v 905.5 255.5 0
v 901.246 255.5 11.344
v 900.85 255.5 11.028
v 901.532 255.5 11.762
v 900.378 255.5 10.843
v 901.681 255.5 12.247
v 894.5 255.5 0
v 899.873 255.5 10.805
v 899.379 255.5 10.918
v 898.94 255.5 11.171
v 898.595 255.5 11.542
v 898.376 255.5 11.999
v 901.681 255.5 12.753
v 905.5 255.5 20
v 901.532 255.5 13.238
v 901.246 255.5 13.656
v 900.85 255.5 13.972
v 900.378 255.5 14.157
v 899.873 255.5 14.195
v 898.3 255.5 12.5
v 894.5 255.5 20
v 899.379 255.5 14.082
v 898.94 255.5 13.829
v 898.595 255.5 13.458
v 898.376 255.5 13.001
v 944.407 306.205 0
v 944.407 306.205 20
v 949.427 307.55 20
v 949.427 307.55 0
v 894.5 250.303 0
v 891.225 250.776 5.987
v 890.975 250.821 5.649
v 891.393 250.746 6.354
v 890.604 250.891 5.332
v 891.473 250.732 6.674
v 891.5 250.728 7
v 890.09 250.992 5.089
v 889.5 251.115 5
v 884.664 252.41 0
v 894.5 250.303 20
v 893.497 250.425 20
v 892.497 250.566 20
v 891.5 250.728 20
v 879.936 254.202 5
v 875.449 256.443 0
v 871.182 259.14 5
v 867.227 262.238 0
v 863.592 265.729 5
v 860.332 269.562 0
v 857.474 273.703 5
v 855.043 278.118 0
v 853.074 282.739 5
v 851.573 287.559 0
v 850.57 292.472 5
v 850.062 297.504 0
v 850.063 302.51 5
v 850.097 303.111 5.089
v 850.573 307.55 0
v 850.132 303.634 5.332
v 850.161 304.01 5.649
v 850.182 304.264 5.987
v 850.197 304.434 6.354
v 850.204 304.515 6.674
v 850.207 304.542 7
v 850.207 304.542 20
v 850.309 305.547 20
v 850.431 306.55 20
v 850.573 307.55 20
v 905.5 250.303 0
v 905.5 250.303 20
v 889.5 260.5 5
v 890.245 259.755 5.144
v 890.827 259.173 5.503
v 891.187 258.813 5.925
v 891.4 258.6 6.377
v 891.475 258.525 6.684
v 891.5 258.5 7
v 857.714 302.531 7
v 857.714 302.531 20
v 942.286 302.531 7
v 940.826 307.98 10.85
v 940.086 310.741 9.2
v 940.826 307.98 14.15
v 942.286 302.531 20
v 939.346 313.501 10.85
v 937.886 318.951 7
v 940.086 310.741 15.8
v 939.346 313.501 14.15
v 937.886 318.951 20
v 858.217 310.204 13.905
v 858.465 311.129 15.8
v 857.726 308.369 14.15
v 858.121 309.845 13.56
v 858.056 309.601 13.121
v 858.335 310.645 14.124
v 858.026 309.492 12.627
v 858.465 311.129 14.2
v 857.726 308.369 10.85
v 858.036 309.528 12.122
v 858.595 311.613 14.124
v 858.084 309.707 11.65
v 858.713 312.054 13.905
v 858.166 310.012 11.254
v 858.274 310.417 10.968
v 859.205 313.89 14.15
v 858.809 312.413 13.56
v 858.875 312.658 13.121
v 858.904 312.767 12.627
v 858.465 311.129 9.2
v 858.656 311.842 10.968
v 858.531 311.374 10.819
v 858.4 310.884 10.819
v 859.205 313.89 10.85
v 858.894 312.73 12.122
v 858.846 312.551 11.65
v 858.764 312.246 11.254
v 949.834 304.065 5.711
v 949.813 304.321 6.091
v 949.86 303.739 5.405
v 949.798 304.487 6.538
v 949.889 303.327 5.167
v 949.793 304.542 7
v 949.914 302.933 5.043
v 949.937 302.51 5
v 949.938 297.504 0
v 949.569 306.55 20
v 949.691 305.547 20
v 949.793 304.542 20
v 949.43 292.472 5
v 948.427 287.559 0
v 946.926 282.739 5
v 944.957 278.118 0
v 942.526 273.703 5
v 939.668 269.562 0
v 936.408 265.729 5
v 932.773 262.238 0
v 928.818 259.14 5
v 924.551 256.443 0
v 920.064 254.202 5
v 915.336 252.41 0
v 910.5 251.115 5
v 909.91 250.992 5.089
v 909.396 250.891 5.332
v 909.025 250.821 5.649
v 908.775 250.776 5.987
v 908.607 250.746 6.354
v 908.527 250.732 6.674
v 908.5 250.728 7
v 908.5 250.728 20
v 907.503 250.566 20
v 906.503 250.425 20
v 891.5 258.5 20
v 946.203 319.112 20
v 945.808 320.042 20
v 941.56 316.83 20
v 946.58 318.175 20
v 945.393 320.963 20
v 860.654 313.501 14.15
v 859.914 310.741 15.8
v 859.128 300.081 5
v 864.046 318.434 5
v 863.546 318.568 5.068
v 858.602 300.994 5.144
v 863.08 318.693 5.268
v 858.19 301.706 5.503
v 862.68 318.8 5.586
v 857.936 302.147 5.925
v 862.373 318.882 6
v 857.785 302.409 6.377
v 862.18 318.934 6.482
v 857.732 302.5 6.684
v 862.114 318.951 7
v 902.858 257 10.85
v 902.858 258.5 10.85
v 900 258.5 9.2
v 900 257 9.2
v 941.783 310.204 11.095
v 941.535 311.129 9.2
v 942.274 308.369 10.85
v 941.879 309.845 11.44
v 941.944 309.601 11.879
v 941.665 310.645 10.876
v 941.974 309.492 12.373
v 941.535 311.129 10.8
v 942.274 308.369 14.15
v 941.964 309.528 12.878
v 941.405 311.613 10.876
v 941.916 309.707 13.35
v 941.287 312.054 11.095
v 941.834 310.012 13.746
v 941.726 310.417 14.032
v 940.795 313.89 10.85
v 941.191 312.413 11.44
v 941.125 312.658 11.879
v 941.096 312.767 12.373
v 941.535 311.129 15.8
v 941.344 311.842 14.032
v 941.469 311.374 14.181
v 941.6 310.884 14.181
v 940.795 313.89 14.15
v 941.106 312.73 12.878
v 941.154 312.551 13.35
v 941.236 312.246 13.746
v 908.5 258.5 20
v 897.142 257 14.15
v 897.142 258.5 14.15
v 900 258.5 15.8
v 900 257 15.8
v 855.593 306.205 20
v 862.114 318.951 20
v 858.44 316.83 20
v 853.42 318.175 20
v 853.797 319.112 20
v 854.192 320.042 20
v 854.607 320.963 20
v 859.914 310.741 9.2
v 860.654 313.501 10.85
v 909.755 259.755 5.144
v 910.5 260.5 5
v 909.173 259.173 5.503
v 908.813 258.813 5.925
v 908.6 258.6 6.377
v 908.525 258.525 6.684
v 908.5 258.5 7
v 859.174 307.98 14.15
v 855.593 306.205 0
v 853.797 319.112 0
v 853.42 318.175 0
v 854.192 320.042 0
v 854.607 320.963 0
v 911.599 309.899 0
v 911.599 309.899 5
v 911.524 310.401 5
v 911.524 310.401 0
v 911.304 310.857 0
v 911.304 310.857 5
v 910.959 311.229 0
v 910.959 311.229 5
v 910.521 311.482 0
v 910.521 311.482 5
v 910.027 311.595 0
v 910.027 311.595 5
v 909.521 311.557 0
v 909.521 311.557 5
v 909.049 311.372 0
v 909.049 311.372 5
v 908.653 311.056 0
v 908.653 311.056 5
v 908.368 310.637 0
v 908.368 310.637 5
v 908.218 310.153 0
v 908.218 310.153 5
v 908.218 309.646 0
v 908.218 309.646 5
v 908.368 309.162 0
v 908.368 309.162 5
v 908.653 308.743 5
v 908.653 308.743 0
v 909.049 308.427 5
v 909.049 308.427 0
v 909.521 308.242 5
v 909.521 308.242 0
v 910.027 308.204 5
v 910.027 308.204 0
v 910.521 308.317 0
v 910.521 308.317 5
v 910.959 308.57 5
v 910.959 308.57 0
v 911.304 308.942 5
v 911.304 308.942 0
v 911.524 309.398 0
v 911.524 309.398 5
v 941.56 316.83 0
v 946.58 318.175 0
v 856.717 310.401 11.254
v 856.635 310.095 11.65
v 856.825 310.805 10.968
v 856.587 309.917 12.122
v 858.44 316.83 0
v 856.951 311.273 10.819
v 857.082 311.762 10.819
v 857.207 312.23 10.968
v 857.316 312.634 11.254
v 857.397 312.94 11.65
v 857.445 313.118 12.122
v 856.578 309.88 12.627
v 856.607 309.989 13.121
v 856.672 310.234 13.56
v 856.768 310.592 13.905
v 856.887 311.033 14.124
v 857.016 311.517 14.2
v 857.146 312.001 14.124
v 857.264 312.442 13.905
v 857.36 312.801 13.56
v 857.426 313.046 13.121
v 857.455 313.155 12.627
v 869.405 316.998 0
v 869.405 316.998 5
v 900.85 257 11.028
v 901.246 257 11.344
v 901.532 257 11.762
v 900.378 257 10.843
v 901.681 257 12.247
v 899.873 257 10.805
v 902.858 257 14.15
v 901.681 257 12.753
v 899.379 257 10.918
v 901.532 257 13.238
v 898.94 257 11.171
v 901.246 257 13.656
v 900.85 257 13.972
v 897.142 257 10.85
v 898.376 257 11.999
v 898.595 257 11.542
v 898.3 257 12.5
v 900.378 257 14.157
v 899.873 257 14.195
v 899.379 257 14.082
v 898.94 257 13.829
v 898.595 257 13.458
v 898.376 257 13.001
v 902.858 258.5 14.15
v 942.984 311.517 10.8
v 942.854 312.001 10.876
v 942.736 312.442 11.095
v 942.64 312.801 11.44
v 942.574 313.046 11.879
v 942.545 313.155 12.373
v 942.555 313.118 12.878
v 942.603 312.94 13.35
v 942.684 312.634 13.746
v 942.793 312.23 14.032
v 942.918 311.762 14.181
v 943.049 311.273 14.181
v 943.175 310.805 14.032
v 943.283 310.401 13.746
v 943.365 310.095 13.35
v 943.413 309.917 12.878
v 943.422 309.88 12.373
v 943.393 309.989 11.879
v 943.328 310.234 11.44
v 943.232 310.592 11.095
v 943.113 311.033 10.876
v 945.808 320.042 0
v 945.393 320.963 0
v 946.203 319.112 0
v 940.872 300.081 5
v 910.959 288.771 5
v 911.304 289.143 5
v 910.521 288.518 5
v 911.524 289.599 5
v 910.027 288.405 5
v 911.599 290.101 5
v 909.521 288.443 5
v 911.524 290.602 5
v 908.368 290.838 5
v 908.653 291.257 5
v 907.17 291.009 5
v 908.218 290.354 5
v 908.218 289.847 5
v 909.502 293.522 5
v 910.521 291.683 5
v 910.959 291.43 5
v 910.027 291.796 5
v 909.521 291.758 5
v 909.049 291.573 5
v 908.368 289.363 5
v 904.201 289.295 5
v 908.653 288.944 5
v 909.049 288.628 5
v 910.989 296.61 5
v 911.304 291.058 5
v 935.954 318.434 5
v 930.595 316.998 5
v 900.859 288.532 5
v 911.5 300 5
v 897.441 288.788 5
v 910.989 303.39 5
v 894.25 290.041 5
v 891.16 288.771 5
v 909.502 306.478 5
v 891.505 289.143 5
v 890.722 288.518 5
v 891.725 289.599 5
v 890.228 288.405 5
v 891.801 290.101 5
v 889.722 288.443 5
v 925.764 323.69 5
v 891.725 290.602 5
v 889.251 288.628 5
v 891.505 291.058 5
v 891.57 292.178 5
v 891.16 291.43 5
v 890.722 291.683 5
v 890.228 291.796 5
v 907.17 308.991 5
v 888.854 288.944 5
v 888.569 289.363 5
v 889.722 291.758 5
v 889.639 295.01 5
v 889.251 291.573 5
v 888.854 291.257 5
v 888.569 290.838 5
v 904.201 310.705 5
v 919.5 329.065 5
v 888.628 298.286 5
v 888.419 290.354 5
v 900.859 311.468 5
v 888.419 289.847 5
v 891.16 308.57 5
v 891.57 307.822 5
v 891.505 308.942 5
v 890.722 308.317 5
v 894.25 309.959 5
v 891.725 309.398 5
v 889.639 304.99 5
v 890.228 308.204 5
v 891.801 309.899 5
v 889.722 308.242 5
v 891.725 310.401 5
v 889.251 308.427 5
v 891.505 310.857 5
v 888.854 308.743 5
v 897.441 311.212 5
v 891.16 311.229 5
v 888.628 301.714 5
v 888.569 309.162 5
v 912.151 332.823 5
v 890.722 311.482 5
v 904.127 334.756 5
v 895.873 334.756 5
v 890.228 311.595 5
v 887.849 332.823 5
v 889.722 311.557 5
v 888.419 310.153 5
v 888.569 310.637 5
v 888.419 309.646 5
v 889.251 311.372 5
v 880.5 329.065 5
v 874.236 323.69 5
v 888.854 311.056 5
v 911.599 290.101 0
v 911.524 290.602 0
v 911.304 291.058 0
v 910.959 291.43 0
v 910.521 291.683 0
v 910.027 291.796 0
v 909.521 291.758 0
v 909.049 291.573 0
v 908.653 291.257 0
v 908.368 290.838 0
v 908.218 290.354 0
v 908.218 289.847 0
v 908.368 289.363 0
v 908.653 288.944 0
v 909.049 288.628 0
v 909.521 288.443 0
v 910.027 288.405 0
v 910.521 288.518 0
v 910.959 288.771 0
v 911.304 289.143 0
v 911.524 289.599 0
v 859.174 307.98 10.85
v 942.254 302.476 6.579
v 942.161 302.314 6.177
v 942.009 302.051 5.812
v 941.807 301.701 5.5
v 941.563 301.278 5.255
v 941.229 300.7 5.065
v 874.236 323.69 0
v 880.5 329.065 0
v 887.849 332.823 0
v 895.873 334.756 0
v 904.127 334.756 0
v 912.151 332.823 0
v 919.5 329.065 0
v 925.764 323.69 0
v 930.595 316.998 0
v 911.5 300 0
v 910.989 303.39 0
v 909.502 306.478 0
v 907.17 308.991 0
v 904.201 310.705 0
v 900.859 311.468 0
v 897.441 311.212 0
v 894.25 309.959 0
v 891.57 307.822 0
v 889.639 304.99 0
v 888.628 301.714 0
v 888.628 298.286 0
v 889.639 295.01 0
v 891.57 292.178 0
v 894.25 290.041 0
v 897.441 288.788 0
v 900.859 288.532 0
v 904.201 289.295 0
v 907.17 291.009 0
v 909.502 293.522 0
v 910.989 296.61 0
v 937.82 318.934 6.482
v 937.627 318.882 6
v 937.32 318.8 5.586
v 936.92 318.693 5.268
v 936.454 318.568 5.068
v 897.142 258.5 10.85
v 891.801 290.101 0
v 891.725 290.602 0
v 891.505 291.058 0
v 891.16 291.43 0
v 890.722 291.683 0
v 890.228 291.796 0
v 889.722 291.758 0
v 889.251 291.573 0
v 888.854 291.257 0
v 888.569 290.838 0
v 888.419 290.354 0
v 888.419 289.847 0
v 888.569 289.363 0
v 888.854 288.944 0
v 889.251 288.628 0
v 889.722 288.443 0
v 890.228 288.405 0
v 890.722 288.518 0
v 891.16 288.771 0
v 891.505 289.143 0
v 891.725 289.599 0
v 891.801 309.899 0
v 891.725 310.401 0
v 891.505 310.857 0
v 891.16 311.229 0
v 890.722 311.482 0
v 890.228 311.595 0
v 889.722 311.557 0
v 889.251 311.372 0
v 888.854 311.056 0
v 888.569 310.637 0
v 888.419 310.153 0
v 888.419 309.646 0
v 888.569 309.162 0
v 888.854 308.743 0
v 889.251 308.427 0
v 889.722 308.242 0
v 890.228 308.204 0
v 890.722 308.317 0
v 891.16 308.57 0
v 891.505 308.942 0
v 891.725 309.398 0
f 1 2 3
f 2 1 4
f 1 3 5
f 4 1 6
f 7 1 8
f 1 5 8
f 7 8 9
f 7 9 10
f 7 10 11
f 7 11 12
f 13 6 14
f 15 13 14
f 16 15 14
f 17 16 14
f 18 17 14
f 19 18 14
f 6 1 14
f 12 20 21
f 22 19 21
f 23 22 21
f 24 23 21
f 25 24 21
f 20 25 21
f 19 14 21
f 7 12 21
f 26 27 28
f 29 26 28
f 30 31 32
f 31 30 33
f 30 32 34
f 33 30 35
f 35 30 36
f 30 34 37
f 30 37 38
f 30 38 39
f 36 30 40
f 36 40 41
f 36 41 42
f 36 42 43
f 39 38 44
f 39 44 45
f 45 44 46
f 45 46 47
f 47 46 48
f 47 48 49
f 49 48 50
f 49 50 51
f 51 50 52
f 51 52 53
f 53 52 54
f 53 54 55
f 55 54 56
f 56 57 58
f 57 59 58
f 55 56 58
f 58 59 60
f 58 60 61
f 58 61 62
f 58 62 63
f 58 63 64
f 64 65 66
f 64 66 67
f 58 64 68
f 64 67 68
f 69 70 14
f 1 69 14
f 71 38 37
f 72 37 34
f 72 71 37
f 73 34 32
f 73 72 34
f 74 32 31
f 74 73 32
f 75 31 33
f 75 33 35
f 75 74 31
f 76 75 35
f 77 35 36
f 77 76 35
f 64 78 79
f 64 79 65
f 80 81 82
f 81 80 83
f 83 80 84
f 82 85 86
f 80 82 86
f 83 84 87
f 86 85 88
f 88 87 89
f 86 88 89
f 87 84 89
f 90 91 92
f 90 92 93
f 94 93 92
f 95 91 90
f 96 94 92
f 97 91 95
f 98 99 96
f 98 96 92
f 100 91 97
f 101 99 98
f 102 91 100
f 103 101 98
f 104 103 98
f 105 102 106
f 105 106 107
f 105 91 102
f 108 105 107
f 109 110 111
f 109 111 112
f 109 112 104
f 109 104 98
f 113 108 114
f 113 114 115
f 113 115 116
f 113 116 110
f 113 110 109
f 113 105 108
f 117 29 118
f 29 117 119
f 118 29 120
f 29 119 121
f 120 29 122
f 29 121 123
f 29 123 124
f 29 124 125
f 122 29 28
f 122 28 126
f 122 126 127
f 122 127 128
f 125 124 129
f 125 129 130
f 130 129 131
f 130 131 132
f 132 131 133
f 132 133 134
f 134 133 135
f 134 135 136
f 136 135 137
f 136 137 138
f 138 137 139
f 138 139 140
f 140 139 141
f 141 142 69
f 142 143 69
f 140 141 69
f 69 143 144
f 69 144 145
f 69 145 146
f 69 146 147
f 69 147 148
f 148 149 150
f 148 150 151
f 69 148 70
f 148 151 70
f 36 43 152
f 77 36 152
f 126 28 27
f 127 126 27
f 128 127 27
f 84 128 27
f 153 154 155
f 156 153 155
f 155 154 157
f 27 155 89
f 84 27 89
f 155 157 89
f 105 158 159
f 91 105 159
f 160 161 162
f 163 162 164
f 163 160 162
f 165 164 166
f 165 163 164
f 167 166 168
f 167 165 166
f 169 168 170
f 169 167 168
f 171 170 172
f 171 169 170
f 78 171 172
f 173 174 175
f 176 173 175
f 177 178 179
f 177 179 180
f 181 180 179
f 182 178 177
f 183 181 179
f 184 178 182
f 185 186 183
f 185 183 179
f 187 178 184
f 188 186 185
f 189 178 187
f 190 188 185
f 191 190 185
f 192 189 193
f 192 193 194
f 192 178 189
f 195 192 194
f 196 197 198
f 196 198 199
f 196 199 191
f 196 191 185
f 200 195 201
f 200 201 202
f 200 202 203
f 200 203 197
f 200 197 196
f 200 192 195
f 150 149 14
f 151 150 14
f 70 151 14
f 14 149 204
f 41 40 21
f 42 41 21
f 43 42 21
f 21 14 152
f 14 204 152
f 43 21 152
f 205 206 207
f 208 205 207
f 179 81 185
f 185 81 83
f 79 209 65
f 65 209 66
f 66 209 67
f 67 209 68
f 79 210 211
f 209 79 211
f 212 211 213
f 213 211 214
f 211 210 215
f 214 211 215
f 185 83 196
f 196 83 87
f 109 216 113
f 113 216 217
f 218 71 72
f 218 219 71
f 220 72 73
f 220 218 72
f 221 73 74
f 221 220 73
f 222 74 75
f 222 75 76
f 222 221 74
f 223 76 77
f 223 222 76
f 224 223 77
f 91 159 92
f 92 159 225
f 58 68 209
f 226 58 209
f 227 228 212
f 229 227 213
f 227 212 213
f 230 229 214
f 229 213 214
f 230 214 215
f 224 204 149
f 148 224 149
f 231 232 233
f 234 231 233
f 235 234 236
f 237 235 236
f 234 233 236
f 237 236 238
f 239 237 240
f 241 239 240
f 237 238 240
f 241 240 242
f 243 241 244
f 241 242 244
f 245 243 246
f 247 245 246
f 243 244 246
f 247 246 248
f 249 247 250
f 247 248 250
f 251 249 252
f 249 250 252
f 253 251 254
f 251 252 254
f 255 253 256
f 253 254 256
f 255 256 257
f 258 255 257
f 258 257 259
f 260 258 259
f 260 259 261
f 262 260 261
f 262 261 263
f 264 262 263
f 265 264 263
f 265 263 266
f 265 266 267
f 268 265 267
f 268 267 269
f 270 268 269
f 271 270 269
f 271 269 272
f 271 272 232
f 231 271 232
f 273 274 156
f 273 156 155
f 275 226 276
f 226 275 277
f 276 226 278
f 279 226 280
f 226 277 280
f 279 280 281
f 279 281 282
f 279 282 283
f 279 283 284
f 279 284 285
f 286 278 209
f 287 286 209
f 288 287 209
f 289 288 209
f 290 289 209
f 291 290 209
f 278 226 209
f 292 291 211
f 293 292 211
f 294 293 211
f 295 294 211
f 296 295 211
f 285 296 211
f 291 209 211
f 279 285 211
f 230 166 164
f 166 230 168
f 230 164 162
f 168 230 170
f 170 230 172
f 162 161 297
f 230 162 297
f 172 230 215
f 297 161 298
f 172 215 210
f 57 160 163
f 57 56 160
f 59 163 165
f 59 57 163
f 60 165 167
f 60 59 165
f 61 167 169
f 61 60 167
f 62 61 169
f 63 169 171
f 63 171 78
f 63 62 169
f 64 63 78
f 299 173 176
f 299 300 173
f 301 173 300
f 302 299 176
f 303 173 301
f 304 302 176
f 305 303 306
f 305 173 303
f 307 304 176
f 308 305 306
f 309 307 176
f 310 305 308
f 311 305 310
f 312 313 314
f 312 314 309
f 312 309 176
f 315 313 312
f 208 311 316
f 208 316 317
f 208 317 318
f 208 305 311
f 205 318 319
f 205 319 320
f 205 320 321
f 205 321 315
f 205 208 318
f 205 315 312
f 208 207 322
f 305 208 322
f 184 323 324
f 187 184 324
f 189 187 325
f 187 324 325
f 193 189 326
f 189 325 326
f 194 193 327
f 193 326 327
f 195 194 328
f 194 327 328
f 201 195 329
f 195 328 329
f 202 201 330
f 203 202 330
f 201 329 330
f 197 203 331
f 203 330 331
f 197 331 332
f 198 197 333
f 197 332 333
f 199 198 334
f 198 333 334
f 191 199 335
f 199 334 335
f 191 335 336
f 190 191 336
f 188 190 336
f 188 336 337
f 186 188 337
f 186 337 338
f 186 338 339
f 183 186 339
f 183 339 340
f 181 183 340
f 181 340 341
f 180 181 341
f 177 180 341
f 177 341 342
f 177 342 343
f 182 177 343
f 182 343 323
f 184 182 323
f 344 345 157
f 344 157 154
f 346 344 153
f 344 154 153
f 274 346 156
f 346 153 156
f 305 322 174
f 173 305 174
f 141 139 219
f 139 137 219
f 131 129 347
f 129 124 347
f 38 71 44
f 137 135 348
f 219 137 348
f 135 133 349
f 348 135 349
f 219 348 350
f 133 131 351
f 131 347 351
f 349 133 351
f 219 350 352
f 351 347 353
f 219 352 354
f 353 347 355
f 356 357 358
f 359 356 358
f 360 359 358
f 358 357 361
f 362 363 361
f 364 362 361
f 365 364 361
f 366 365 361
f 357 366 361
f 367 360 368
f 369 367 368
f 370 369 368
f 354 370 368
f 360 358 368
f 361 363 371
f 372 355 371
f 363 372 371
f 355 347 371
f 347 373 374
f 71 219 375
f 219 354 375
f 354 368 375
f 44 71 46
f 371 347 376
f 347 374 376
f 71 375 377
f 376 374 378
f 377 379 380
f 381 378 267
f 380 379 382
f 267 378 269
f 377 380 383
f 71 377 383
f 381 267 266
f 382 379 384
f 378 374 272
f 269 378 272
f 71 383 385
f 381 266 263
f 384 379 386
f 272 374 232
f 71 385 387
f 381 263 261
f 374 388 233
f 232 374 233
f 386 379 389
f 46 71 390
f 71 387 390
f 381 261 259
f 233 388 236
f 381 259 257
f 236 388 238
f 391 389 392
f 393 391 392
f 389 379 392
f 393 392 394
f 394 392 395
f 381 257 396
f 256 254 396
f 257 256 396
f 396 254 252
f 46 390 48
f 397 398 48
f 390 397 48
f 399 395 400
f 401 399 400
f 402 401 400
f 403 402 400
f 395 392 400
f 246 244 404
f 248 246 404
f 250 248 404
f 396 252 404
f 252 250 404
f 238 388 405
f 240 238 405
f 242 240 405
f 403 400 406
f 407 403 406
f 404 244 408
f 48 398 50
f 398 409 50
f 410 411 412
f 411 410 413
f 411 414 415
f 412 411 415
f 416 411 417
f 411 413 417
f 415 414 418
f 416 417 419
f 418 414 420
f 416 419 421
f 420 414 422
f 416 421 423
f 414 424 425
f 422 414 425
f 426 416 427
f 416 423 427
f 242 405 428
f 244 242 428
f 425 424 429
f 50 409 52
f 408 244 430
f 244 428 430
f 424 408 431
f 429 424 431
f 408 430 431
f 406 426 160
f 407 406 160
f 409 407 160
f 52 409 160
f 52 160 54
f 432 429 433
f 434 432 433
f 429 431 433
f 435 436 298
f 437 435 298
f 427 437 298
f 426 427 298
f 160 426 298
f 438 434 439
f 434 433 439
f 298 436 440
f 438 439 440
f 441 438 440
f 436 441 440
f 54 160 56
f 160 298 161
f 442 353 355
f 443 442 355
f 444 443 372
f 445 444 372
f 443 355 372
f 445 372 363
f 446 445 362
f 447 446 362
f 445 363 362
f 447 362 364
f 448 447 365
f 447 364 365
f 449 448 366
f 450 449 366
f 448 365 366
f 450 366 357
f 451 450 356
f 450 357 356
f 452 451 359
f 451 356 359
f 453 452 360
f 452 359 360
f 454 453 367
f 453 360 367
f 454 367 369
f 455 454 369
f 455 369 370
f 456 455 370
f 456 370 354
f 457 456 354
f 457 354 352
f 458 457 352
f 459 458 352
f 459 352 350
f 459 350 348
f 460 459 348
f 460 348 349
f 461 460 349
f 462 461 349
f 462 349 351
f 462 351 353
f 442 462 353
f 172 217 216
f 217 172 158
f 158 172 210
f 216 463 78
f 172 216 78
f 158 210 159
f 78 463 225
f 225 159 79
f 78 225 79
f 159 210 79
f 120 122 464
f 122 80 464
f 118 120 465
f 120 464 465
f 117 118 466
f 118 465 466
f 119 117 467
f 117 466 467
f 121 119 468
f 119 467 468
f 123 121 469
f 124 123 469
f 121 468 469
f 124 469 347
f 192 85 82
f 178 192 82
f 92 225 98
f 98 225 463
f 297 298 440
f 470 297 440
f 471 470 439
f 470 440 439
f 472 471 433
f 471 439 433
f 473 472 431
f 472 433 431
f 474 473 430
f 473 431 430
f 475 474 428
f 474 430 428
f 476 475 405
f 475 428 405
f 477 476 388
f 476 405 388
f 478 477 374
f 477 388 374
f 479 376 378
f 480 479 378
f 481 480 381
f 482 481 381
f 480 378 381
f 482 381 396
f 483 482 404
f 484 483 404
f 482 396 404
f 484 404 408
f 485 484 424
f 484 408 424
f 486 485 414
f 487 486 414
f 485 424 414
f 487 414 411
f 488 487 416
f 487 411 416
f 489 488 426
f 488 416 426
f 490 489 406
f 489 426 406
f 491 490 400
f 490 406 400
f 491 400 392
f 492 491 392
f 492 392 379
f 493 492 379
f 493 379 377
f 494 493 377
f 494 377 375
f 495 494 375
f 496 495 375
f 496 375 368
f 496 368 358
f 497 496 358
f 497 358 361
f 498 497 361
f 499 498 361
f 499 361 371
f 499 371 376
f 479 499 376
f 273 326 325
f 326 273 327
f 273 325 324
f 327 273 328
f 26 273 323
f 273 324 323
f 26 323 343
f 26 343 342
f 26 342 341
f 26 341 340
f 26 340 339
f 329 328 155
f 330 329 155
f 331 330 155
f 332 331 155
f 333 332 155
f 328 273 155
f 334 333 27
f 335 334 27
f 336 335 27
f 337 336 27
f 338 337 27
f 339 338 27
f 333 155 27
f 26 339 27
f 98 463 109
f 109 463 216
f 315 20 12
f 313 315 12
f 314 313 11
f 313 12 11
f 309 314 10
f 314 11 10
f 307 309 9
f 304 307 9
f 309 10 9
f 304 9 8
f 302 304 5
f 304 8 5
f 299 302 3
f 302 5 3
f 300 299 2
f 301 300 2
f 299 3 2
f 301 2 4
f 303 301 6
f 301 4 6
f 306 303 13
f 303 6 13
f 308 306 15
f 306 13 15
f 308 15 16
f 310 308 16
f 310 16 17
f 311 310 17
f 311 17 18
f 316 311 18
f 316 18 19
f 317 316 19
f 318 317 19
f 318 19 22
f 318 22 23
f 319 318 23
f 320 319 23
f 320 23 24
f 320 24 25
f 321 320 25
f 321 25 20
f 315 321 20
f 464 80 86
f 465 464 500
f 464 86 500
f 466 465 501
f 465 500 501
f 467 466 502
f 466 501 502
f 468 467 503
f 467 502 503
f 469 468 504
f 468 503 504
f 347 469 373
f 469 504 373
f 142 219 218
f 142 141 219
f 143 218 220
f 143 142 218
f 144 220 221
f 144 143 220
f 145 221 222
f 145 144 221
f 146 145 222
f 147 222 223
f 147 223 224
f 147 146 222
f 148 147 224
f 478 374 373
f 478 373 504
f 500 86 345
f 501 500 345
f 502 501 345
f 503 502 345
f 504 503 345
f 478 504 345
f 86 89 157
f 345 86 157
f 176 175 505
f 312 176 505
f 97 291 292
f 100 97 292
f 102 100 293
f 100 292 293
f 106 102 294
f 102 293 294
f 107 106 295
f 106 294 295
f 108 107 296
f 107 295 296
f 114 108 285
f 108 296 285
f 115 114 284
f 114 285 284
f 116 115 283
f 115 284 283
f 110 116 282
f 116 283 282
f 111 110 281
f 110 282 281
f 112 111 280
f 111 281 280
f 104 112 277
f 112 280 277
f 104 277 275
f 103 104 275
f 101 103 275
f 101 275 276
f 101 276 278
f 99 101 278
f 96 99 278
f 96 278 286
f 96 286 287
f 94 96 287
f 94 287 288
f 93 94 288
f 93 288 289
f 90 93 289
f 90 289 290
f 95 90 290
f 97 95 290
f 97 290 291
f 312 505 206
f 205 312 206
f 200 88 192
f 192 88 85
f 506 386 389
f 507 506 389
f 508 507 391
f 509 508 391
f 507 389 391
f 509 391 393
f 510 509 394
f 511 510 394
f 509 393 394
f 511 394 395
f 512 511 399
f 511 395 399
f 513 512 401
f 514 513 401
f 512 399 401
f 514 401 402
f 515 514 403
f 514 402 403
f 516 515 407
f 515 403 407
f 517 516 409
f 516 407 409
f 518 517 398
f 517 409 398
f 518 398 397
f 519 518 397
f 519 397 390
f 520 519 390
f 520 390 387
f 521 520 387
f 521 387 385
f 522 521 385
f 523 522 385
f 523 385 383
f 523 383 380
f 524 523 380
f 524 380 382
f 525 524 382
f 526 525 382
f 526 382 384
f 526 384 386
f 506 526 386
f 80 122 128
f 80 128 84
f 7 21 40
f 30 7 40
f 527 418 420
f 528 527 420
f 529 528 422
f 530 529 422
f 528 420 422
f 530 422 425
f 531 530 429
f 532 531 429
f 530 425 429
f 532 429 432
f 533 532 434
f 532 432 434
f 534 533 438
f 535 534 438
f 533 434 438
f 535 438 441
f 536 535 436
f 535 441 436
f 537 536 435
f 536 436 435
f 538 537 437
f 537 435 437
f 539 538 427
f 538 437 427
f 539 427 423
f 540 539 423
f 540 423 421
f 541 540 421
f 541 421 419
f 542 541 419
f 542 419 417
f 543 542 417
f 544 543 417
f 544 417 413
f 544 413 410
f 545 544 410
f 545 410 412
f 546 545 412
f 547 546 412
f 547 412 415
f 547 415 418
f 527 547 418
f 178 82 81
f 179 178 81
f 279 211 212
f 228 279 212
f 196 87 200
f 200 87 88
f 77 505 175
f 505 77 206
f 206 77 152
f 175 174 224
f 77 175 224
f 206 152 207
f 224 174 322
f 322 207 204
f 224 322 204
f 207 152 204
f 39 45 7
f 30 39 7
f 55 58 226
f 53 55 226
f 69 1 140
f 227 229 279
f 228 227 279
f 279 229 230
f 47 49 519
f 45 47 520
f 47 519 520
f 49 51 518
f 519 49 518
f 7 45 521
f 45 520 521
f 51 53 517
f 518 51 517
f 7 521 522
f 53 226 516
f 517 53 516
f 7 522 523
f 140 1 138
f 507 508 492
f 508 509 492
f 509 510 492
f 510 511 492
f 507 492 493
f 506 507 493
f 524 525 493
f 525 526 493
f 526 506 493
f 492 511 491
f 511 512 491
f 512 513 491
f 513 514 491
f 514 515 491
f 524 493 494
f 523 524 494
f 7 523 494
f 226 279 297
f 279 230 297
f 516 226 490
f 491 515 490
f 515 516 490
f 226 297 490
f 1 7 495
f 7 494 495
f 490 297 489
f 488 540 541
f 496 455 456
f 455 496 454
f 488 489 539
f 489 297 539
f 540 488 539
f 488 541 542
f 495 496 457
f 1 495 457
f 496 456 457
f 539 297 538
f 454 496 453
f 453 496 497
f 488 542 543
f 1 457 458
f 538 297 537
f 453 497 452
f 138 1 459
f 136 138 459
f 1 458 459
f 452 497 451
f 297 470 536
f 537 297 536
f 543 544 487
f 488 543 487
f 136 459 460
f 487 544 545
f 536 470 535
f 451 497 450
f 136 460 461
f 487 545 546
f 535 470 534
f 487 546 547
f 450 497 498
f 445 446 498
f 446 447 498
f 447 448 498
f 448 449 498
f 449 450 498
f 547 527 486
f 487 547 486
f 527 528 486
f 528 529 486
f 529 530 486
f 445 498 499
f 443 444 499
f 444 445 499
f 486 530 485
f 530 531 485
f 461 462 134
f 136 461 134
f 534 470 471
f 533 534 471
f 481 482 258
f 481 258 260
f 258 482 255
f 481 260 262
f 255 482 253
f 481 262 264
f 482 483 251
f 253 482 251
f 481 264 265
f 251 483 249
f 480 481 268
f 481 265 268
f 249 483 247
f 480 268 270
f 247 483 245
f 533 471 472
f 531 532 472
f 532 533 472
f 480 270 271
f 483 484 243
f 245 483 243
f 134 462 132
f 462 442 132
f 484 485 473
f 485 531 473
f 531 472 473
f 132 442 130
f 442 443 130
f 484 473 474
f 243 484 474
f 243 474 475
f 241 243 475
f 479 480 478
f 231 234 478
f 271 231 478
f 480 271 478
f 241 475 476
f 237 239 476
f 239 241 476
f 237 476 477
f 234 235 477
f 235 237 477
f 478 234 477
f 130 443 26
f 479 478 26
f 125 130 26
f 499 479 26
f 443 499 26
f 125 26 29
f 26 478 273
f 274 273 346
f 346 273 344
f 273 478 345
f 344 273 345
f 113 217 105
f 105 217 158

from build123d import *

# Parameters (mm, degrees)
CUT_EXTRUDE_1_DEPTH         = 1013.4351831105043
EXTRUDE_START               = 14.999999999999998
EXTRUDE_1_DEPTH             = 14.999999999999998
CUT_EXTRUDE_2_DEPTH         = 1008.5341185289956
EXTRUDE_2_DEPTH             = 14.999999999999998
CUT_EXTRUDE_3_DEPTH         = 1008.5341185289956
EXTRUDE_3_DEPTH             = 14.999999999999998
CUT_EXTRUDE_4_DEPTH         = 1008.5341185289956
CUT_EXTRUDE_5_DEPTH         = 1.5000000000000013
CUT_EXTRUDE_6_DEPTH         = 1.500000000000375
CUT_EXTRUDE_7_DEPTH         = 1.500000000000482
HOLE_WIZARD_23_0_23_1_D     = 23
HOLE_WIZARD_23_0_23_1_DEPTH = 20
HOLE_WIZARD_3_4_3_4_1_D     = 3.4
HOLE_WIZARD_3_4_3_4_1_DEPTH = 20
HOLE_WIZARD_3_4_3_4_2_D     = 3.4
HOLE_WIZARD_3_4_3_4_2_DEPTH = 6.696579359
HOLE_WIZARD_3_4_3_4_3_D     = 3.4
HOLE_WIZARD_3_4_3_4_3_DEPTH = 14.354957893
HOLE_WIZARD_3_4_3_4_4_D     = 3.4
HOLE_WIZARD_3_4_3_4_4_DEPTH = 14.354957893
FILLET_1_R                  = 2


with BuildPart() as part:
    # 草图1 → 旋转1 (revolve)
    with BuildSketch(Plane.XZ.offset(-300), mode=Mode.PRIVATE) as revolve_1_sk:
        Polygon((950.0000000000001, 5), (900, 4.999999999999999), (900, 0), (950.0000000000001, 0), align=None)
    revolve(revolve_1_sk.sketch.rotate(Axis((900, 300, 4.999999999999999), (0, 0, -1)), 180), axis=Axis((900, 300, 4.999999999999999), (0, 0, -1)))

    # 草图2 → 切除-拉伸1 (cut, through all)
    with BuildSketch(Plane.XY.offset(4.999999999999999)):
        with BuildLine():
            Line((854.6066683745289, 320.9629540842885), (869.404681855504, 316.99783832247647))
            ThreePointArc((869.404681855504, 316.99783832247647), (900, 334.99999999999966), (930.5953181444959, 316.99783832247647))
            Line((930.5953181444959, 316.99783832247647), (945.393331625471, 320.9629540842885))
            ThreePointArc((945.393331625471, 320.9629540842885), (900, 349.9999999999997), (854.6066683745289, 320.9629540842885))
        make_face()
    extrude(amount=-CUT_EXTRUDE_1_DEPTH, mode=Mode.SUBTRACT)

    # 草图3 → 凸台-拉伸1 (add)
    with BuildSketch(Plane.XY.offset(4.999999999999999).offset(EXTRUDE_START)):
        with BuildLine():
            Line((854.6066683745289, 320.9629540842885), (862.114040092375, 318.9513598952115))
            Line((862.114040092375, 318.9513598952115), (857.7141163256321, 302.5306208482976))
            Line((857.7141163256321, 302.5306208482976), (850.206744607786, 304.5422150373745))
            ThreePointArc((850.206744607786, 304.5422150373745), (851.7037086855465, 312.9409522551258), (854.6066683745289, 320.9629540842885))
        make_face()
    extrude(amount=-EXTRUDE_1_DEPTH)

    # 草图4 → 切除-拉伸2 (cut, through all)
    with BuildSketch(Plane.XY.offset(19.999999999999996)):
        with BuildLine():
            Line((850.573285770712, 307.549829170006), (855.592795982073, 306.204855462472))
            Line((855.592795982073, 306.204855462472), (858.4398054782009, 316.830039551652))
            Line((858.4398054782009, 316.830039551652), (853.4202952668401, 318.175013259186))
            ThreePointArc((853.4202952668401, 318.175013259186), (851.7037086855471, 312.9409522551259), (850.573285770712, 307.549829170006))
        make_face()
    extrude(amount=-CUT_EXTRUDE_2_DEPTH, mode=Mode.SUBTRACT)

    # 草图5 → 凸台-拉伸2 (add)
    with BuildSketch(Plane.XY.offset(4.999999999999999).offset(EXTRUDE_START)):
        with BuildLine():
            Line((891.5, 250.7277968830295), (891.5, 258.5))
            Line((891.5, 258.5), (908.5, 258.5))
            Line((908.5, 258.5), (908.5, 250.7277968830295))
            ThreePointArc((908.5, 250.7277968830295), (900, 250.00000000000003), (891.5, 250.7277968830295))
        make_face()
    extrude(amount=-EXTRUDE_2_DEPTH)

    # 草图6 → 切除-拉伸3 (cut, through all)
    with BuildSketch(Plane.XY.offset(19.999999999999996)):
        with BuildLine():
            Line((905.5, 250.30342064085298), (905.5, 255.5))
            Line((905.5, 255.5), (894.5, 255.5))
            Line((894.5, 255.5), (894.5, 250.30342064085298))
            ThreePointArc((894.5, 250.30342064085298), (900, 250.00000000000003), (905.5, 250.30342064085298))
        make_face()
    extrude(amount=-CUT_EXTRUDE_3_DEPTH, mode=Mode.SUBTRACT)

    # 草图7 → 凸台-拉伸3 (add)
    with BuildSketch(Plane.XY.offset(4.999999999999999).offset(EXTRUDE_START)):
        with BuildLine():
            Line((949.7932553922141, 304.5422150373745), (942.285883674368, 302.5306208482975))
            Line((942.285883674368, 302.5306208482975), (937.885959907625, 318.9513598952115))
            Line((937.885959907625, 318.9513598952115), (945.393331625471, 320.9629540842885))
            ThreePointArc((945.393331625471, 320.9629540842885), (948.2962913144532, 312.94095225512575), (949.7932553922141, 304.5422150373745))
        make_face()
    extrude(amount=-EXTRUDE_3_DEPTH)

    # 草图8 → 切除-拉伸4 (cut, through all)
    with BuildSketch(Plane.XY.offset(19.999999999999996)):
        with BuildLine():
            Line((946.5797047331605, 318.17501325918545), (941.5601945218003, 316.83003955165213))
            Line((941.5601945218003, 316.83003955165213), (944.4072040179273, 306.20485546247204))
            Line((944.4072040179273, 306.20485546247204), (949.4267142292881, 307.5498291700056))
            ThreePointArc((949.4267142292881, 307.5498291700056), (948.2962913144534, 312.94095225512547), (946.5797047331605, 318.17501325918545))
        make_face()
    extrude(amount=-CUT_EXTRUDE_4_DEPTH, mode=Mode.SUBTRACT)

    # 草图9 → 切除-拉伸5 (cut)
    with BuildSketch(Plane(origin=(0, 258.5, 0), x_dir=(-1, 0, 0), z_dir=(0, 1, 0))):
        Polygon((-902.857883832489, 14.149999999999999), (-902.857883832489, 10.85), (-900, 9.2), (-897.1421161675111, 10.85), (-897.1421161675121, 14.149999999999999), (-900, 15.8), align=None)
    extrude(amount=-CUT_EXTRUDE_5_DEPTH, mode=Mode.SUBTRACT)

    # 草图10 → 切除-拉伸6 (cut)
    with BuildSketch(Plane(origin=(724.6255099119961, -194.16282019591551, 0), x_dir=(0, 0, -1), z_dir=(0.9659258262890664, -0.25881904510252784, 0))):
        Polygon((-14.149999999999999, 519.8570046465061), (-10.85, 519.8570046465061), (-9.2, 522.7148884789947), (-10.85, 525.5727723114834), (-14.149999999999999, 525.5727723114834), (-15.8, 522.7148884789947), align=None)
    extrude(amount=-CUT_EXTRUDE_6_DEPTH, mode=Mode.SUBTRACT)

    # 草图11 → 切除-拉伸7 (cut)
    with BuildSketch(Plane(origin=(954.7973534939916, 255.83717980410037, 0), x_dir=(0, 0, 1), z_dir=(-0.9659258262890652, -0.2588190451025323, 0))):
        Polygon((10.85, 59.69849112692882), (9.2, 56.8406072944401), (10.85, 53.98272346195163), (14.149999999999999, 53.98272346195163), (15.8, 56.8406072944401), (14.149999999999999, 59.69849112692882), align=None)
    extrude(amount=-CUT_EXTRUDE_7_DEPTH, mode=Mode.SUBTRACT)

    # Ø23.0 (23) 直径孔1
    with Locations(Plane(origin=(0, 0, 0), x_dir=(-1, 0, 0), z_dir=(0, 0, -1))):
        with Locations((-900, 300)):
            Hole(HOLE_WIZARD_23_0_23_1_D / 2, depth=HOLE_WIZARD_23_0_23_1_DEPTH)

    # Ø3.4 (3.4) 直径孔1
    with Locations(Plane(origin=(0, 0, 0), x_dir=(-1, 0, 0), z_dir=(0, 0, -1))):
        with Locations((-909.899494937, 290.100505063), (-909.899494937, 309.899494937), (-890.100505063, 309.899494937), (-890.100505063, 290.100505063)):
            Hole(HOLE_WIZARD_3_4_3_4_1_D / 2, depth=HOLE_WIZARD_3_4_3_4_1_DEPTH)

    # Ø3.4 (3.4) 直径孔2
    with Locations(Plane(origin=(0, 257, 0), x_dir=(1, 0, 0), z_dir=(0, 1, 0))):
        with Locations((900, -12.5)):
            Hole(HOLE_WIZARD_3_4_3_4_2_D / 2, depth=HOLE_WIZARD_3_4_3_4_2_DEPTH)

    # Ø3.4 (3.4) 直径孔3
    with Locations(Plane(origin=(723.1766211725698, -193.77459162825534, 0), x_dir=(0, 0, -1), z_dir=(0.9659258262890692, -0.2588190451025174, 0))):
        with Locations((-12.5, 522.714888479)):
            Hole(HOLE_WIZARD_3_4_3_4_3_D / 2, depth=HOLE_WIZARD_3_4_3_4_3_DEPTH)

    # Ø3.4 (3.4) 直径孔4
    with Locations(Plane(origin=(956.2462422334311, 256.22540837172977, 0), x_dir=(0, 0, 1), z_dir=(-0.9659258262890719, -0.25881904510250775, 0))):
        with Locations((12.5, 56.840607294)):
            Hole(HOLE_WIZARD_3_4_3_4_4_D / 2, depth=HOLE_WIZARD_3_4_3_4_4_DEPTH)

    # 圆角1
    fillet_1_edges = [part.edges().sort_by_distance(p)[0] for p in [
        (853.9604304667091, 303.536417942836, 4.999999999999999),
        (859.9140782090035, 310.74099037175455, 4.999999999999999),
        (908.5, 254.61389844151475, 4.999999999999999),
        (900, 258.5, 4.999999999999999),
        (891.5, 254.61389844151475, 4.999999999999999),
        (940.0859217909965, 310.7409903717545, 4.999999999999999),
        (946.0395695332911, 303.536417942836, 4.999999999999999),
    ]]
    fillet(fillet_1_edges, radius=FILLET_1_R)


solid = part.part
